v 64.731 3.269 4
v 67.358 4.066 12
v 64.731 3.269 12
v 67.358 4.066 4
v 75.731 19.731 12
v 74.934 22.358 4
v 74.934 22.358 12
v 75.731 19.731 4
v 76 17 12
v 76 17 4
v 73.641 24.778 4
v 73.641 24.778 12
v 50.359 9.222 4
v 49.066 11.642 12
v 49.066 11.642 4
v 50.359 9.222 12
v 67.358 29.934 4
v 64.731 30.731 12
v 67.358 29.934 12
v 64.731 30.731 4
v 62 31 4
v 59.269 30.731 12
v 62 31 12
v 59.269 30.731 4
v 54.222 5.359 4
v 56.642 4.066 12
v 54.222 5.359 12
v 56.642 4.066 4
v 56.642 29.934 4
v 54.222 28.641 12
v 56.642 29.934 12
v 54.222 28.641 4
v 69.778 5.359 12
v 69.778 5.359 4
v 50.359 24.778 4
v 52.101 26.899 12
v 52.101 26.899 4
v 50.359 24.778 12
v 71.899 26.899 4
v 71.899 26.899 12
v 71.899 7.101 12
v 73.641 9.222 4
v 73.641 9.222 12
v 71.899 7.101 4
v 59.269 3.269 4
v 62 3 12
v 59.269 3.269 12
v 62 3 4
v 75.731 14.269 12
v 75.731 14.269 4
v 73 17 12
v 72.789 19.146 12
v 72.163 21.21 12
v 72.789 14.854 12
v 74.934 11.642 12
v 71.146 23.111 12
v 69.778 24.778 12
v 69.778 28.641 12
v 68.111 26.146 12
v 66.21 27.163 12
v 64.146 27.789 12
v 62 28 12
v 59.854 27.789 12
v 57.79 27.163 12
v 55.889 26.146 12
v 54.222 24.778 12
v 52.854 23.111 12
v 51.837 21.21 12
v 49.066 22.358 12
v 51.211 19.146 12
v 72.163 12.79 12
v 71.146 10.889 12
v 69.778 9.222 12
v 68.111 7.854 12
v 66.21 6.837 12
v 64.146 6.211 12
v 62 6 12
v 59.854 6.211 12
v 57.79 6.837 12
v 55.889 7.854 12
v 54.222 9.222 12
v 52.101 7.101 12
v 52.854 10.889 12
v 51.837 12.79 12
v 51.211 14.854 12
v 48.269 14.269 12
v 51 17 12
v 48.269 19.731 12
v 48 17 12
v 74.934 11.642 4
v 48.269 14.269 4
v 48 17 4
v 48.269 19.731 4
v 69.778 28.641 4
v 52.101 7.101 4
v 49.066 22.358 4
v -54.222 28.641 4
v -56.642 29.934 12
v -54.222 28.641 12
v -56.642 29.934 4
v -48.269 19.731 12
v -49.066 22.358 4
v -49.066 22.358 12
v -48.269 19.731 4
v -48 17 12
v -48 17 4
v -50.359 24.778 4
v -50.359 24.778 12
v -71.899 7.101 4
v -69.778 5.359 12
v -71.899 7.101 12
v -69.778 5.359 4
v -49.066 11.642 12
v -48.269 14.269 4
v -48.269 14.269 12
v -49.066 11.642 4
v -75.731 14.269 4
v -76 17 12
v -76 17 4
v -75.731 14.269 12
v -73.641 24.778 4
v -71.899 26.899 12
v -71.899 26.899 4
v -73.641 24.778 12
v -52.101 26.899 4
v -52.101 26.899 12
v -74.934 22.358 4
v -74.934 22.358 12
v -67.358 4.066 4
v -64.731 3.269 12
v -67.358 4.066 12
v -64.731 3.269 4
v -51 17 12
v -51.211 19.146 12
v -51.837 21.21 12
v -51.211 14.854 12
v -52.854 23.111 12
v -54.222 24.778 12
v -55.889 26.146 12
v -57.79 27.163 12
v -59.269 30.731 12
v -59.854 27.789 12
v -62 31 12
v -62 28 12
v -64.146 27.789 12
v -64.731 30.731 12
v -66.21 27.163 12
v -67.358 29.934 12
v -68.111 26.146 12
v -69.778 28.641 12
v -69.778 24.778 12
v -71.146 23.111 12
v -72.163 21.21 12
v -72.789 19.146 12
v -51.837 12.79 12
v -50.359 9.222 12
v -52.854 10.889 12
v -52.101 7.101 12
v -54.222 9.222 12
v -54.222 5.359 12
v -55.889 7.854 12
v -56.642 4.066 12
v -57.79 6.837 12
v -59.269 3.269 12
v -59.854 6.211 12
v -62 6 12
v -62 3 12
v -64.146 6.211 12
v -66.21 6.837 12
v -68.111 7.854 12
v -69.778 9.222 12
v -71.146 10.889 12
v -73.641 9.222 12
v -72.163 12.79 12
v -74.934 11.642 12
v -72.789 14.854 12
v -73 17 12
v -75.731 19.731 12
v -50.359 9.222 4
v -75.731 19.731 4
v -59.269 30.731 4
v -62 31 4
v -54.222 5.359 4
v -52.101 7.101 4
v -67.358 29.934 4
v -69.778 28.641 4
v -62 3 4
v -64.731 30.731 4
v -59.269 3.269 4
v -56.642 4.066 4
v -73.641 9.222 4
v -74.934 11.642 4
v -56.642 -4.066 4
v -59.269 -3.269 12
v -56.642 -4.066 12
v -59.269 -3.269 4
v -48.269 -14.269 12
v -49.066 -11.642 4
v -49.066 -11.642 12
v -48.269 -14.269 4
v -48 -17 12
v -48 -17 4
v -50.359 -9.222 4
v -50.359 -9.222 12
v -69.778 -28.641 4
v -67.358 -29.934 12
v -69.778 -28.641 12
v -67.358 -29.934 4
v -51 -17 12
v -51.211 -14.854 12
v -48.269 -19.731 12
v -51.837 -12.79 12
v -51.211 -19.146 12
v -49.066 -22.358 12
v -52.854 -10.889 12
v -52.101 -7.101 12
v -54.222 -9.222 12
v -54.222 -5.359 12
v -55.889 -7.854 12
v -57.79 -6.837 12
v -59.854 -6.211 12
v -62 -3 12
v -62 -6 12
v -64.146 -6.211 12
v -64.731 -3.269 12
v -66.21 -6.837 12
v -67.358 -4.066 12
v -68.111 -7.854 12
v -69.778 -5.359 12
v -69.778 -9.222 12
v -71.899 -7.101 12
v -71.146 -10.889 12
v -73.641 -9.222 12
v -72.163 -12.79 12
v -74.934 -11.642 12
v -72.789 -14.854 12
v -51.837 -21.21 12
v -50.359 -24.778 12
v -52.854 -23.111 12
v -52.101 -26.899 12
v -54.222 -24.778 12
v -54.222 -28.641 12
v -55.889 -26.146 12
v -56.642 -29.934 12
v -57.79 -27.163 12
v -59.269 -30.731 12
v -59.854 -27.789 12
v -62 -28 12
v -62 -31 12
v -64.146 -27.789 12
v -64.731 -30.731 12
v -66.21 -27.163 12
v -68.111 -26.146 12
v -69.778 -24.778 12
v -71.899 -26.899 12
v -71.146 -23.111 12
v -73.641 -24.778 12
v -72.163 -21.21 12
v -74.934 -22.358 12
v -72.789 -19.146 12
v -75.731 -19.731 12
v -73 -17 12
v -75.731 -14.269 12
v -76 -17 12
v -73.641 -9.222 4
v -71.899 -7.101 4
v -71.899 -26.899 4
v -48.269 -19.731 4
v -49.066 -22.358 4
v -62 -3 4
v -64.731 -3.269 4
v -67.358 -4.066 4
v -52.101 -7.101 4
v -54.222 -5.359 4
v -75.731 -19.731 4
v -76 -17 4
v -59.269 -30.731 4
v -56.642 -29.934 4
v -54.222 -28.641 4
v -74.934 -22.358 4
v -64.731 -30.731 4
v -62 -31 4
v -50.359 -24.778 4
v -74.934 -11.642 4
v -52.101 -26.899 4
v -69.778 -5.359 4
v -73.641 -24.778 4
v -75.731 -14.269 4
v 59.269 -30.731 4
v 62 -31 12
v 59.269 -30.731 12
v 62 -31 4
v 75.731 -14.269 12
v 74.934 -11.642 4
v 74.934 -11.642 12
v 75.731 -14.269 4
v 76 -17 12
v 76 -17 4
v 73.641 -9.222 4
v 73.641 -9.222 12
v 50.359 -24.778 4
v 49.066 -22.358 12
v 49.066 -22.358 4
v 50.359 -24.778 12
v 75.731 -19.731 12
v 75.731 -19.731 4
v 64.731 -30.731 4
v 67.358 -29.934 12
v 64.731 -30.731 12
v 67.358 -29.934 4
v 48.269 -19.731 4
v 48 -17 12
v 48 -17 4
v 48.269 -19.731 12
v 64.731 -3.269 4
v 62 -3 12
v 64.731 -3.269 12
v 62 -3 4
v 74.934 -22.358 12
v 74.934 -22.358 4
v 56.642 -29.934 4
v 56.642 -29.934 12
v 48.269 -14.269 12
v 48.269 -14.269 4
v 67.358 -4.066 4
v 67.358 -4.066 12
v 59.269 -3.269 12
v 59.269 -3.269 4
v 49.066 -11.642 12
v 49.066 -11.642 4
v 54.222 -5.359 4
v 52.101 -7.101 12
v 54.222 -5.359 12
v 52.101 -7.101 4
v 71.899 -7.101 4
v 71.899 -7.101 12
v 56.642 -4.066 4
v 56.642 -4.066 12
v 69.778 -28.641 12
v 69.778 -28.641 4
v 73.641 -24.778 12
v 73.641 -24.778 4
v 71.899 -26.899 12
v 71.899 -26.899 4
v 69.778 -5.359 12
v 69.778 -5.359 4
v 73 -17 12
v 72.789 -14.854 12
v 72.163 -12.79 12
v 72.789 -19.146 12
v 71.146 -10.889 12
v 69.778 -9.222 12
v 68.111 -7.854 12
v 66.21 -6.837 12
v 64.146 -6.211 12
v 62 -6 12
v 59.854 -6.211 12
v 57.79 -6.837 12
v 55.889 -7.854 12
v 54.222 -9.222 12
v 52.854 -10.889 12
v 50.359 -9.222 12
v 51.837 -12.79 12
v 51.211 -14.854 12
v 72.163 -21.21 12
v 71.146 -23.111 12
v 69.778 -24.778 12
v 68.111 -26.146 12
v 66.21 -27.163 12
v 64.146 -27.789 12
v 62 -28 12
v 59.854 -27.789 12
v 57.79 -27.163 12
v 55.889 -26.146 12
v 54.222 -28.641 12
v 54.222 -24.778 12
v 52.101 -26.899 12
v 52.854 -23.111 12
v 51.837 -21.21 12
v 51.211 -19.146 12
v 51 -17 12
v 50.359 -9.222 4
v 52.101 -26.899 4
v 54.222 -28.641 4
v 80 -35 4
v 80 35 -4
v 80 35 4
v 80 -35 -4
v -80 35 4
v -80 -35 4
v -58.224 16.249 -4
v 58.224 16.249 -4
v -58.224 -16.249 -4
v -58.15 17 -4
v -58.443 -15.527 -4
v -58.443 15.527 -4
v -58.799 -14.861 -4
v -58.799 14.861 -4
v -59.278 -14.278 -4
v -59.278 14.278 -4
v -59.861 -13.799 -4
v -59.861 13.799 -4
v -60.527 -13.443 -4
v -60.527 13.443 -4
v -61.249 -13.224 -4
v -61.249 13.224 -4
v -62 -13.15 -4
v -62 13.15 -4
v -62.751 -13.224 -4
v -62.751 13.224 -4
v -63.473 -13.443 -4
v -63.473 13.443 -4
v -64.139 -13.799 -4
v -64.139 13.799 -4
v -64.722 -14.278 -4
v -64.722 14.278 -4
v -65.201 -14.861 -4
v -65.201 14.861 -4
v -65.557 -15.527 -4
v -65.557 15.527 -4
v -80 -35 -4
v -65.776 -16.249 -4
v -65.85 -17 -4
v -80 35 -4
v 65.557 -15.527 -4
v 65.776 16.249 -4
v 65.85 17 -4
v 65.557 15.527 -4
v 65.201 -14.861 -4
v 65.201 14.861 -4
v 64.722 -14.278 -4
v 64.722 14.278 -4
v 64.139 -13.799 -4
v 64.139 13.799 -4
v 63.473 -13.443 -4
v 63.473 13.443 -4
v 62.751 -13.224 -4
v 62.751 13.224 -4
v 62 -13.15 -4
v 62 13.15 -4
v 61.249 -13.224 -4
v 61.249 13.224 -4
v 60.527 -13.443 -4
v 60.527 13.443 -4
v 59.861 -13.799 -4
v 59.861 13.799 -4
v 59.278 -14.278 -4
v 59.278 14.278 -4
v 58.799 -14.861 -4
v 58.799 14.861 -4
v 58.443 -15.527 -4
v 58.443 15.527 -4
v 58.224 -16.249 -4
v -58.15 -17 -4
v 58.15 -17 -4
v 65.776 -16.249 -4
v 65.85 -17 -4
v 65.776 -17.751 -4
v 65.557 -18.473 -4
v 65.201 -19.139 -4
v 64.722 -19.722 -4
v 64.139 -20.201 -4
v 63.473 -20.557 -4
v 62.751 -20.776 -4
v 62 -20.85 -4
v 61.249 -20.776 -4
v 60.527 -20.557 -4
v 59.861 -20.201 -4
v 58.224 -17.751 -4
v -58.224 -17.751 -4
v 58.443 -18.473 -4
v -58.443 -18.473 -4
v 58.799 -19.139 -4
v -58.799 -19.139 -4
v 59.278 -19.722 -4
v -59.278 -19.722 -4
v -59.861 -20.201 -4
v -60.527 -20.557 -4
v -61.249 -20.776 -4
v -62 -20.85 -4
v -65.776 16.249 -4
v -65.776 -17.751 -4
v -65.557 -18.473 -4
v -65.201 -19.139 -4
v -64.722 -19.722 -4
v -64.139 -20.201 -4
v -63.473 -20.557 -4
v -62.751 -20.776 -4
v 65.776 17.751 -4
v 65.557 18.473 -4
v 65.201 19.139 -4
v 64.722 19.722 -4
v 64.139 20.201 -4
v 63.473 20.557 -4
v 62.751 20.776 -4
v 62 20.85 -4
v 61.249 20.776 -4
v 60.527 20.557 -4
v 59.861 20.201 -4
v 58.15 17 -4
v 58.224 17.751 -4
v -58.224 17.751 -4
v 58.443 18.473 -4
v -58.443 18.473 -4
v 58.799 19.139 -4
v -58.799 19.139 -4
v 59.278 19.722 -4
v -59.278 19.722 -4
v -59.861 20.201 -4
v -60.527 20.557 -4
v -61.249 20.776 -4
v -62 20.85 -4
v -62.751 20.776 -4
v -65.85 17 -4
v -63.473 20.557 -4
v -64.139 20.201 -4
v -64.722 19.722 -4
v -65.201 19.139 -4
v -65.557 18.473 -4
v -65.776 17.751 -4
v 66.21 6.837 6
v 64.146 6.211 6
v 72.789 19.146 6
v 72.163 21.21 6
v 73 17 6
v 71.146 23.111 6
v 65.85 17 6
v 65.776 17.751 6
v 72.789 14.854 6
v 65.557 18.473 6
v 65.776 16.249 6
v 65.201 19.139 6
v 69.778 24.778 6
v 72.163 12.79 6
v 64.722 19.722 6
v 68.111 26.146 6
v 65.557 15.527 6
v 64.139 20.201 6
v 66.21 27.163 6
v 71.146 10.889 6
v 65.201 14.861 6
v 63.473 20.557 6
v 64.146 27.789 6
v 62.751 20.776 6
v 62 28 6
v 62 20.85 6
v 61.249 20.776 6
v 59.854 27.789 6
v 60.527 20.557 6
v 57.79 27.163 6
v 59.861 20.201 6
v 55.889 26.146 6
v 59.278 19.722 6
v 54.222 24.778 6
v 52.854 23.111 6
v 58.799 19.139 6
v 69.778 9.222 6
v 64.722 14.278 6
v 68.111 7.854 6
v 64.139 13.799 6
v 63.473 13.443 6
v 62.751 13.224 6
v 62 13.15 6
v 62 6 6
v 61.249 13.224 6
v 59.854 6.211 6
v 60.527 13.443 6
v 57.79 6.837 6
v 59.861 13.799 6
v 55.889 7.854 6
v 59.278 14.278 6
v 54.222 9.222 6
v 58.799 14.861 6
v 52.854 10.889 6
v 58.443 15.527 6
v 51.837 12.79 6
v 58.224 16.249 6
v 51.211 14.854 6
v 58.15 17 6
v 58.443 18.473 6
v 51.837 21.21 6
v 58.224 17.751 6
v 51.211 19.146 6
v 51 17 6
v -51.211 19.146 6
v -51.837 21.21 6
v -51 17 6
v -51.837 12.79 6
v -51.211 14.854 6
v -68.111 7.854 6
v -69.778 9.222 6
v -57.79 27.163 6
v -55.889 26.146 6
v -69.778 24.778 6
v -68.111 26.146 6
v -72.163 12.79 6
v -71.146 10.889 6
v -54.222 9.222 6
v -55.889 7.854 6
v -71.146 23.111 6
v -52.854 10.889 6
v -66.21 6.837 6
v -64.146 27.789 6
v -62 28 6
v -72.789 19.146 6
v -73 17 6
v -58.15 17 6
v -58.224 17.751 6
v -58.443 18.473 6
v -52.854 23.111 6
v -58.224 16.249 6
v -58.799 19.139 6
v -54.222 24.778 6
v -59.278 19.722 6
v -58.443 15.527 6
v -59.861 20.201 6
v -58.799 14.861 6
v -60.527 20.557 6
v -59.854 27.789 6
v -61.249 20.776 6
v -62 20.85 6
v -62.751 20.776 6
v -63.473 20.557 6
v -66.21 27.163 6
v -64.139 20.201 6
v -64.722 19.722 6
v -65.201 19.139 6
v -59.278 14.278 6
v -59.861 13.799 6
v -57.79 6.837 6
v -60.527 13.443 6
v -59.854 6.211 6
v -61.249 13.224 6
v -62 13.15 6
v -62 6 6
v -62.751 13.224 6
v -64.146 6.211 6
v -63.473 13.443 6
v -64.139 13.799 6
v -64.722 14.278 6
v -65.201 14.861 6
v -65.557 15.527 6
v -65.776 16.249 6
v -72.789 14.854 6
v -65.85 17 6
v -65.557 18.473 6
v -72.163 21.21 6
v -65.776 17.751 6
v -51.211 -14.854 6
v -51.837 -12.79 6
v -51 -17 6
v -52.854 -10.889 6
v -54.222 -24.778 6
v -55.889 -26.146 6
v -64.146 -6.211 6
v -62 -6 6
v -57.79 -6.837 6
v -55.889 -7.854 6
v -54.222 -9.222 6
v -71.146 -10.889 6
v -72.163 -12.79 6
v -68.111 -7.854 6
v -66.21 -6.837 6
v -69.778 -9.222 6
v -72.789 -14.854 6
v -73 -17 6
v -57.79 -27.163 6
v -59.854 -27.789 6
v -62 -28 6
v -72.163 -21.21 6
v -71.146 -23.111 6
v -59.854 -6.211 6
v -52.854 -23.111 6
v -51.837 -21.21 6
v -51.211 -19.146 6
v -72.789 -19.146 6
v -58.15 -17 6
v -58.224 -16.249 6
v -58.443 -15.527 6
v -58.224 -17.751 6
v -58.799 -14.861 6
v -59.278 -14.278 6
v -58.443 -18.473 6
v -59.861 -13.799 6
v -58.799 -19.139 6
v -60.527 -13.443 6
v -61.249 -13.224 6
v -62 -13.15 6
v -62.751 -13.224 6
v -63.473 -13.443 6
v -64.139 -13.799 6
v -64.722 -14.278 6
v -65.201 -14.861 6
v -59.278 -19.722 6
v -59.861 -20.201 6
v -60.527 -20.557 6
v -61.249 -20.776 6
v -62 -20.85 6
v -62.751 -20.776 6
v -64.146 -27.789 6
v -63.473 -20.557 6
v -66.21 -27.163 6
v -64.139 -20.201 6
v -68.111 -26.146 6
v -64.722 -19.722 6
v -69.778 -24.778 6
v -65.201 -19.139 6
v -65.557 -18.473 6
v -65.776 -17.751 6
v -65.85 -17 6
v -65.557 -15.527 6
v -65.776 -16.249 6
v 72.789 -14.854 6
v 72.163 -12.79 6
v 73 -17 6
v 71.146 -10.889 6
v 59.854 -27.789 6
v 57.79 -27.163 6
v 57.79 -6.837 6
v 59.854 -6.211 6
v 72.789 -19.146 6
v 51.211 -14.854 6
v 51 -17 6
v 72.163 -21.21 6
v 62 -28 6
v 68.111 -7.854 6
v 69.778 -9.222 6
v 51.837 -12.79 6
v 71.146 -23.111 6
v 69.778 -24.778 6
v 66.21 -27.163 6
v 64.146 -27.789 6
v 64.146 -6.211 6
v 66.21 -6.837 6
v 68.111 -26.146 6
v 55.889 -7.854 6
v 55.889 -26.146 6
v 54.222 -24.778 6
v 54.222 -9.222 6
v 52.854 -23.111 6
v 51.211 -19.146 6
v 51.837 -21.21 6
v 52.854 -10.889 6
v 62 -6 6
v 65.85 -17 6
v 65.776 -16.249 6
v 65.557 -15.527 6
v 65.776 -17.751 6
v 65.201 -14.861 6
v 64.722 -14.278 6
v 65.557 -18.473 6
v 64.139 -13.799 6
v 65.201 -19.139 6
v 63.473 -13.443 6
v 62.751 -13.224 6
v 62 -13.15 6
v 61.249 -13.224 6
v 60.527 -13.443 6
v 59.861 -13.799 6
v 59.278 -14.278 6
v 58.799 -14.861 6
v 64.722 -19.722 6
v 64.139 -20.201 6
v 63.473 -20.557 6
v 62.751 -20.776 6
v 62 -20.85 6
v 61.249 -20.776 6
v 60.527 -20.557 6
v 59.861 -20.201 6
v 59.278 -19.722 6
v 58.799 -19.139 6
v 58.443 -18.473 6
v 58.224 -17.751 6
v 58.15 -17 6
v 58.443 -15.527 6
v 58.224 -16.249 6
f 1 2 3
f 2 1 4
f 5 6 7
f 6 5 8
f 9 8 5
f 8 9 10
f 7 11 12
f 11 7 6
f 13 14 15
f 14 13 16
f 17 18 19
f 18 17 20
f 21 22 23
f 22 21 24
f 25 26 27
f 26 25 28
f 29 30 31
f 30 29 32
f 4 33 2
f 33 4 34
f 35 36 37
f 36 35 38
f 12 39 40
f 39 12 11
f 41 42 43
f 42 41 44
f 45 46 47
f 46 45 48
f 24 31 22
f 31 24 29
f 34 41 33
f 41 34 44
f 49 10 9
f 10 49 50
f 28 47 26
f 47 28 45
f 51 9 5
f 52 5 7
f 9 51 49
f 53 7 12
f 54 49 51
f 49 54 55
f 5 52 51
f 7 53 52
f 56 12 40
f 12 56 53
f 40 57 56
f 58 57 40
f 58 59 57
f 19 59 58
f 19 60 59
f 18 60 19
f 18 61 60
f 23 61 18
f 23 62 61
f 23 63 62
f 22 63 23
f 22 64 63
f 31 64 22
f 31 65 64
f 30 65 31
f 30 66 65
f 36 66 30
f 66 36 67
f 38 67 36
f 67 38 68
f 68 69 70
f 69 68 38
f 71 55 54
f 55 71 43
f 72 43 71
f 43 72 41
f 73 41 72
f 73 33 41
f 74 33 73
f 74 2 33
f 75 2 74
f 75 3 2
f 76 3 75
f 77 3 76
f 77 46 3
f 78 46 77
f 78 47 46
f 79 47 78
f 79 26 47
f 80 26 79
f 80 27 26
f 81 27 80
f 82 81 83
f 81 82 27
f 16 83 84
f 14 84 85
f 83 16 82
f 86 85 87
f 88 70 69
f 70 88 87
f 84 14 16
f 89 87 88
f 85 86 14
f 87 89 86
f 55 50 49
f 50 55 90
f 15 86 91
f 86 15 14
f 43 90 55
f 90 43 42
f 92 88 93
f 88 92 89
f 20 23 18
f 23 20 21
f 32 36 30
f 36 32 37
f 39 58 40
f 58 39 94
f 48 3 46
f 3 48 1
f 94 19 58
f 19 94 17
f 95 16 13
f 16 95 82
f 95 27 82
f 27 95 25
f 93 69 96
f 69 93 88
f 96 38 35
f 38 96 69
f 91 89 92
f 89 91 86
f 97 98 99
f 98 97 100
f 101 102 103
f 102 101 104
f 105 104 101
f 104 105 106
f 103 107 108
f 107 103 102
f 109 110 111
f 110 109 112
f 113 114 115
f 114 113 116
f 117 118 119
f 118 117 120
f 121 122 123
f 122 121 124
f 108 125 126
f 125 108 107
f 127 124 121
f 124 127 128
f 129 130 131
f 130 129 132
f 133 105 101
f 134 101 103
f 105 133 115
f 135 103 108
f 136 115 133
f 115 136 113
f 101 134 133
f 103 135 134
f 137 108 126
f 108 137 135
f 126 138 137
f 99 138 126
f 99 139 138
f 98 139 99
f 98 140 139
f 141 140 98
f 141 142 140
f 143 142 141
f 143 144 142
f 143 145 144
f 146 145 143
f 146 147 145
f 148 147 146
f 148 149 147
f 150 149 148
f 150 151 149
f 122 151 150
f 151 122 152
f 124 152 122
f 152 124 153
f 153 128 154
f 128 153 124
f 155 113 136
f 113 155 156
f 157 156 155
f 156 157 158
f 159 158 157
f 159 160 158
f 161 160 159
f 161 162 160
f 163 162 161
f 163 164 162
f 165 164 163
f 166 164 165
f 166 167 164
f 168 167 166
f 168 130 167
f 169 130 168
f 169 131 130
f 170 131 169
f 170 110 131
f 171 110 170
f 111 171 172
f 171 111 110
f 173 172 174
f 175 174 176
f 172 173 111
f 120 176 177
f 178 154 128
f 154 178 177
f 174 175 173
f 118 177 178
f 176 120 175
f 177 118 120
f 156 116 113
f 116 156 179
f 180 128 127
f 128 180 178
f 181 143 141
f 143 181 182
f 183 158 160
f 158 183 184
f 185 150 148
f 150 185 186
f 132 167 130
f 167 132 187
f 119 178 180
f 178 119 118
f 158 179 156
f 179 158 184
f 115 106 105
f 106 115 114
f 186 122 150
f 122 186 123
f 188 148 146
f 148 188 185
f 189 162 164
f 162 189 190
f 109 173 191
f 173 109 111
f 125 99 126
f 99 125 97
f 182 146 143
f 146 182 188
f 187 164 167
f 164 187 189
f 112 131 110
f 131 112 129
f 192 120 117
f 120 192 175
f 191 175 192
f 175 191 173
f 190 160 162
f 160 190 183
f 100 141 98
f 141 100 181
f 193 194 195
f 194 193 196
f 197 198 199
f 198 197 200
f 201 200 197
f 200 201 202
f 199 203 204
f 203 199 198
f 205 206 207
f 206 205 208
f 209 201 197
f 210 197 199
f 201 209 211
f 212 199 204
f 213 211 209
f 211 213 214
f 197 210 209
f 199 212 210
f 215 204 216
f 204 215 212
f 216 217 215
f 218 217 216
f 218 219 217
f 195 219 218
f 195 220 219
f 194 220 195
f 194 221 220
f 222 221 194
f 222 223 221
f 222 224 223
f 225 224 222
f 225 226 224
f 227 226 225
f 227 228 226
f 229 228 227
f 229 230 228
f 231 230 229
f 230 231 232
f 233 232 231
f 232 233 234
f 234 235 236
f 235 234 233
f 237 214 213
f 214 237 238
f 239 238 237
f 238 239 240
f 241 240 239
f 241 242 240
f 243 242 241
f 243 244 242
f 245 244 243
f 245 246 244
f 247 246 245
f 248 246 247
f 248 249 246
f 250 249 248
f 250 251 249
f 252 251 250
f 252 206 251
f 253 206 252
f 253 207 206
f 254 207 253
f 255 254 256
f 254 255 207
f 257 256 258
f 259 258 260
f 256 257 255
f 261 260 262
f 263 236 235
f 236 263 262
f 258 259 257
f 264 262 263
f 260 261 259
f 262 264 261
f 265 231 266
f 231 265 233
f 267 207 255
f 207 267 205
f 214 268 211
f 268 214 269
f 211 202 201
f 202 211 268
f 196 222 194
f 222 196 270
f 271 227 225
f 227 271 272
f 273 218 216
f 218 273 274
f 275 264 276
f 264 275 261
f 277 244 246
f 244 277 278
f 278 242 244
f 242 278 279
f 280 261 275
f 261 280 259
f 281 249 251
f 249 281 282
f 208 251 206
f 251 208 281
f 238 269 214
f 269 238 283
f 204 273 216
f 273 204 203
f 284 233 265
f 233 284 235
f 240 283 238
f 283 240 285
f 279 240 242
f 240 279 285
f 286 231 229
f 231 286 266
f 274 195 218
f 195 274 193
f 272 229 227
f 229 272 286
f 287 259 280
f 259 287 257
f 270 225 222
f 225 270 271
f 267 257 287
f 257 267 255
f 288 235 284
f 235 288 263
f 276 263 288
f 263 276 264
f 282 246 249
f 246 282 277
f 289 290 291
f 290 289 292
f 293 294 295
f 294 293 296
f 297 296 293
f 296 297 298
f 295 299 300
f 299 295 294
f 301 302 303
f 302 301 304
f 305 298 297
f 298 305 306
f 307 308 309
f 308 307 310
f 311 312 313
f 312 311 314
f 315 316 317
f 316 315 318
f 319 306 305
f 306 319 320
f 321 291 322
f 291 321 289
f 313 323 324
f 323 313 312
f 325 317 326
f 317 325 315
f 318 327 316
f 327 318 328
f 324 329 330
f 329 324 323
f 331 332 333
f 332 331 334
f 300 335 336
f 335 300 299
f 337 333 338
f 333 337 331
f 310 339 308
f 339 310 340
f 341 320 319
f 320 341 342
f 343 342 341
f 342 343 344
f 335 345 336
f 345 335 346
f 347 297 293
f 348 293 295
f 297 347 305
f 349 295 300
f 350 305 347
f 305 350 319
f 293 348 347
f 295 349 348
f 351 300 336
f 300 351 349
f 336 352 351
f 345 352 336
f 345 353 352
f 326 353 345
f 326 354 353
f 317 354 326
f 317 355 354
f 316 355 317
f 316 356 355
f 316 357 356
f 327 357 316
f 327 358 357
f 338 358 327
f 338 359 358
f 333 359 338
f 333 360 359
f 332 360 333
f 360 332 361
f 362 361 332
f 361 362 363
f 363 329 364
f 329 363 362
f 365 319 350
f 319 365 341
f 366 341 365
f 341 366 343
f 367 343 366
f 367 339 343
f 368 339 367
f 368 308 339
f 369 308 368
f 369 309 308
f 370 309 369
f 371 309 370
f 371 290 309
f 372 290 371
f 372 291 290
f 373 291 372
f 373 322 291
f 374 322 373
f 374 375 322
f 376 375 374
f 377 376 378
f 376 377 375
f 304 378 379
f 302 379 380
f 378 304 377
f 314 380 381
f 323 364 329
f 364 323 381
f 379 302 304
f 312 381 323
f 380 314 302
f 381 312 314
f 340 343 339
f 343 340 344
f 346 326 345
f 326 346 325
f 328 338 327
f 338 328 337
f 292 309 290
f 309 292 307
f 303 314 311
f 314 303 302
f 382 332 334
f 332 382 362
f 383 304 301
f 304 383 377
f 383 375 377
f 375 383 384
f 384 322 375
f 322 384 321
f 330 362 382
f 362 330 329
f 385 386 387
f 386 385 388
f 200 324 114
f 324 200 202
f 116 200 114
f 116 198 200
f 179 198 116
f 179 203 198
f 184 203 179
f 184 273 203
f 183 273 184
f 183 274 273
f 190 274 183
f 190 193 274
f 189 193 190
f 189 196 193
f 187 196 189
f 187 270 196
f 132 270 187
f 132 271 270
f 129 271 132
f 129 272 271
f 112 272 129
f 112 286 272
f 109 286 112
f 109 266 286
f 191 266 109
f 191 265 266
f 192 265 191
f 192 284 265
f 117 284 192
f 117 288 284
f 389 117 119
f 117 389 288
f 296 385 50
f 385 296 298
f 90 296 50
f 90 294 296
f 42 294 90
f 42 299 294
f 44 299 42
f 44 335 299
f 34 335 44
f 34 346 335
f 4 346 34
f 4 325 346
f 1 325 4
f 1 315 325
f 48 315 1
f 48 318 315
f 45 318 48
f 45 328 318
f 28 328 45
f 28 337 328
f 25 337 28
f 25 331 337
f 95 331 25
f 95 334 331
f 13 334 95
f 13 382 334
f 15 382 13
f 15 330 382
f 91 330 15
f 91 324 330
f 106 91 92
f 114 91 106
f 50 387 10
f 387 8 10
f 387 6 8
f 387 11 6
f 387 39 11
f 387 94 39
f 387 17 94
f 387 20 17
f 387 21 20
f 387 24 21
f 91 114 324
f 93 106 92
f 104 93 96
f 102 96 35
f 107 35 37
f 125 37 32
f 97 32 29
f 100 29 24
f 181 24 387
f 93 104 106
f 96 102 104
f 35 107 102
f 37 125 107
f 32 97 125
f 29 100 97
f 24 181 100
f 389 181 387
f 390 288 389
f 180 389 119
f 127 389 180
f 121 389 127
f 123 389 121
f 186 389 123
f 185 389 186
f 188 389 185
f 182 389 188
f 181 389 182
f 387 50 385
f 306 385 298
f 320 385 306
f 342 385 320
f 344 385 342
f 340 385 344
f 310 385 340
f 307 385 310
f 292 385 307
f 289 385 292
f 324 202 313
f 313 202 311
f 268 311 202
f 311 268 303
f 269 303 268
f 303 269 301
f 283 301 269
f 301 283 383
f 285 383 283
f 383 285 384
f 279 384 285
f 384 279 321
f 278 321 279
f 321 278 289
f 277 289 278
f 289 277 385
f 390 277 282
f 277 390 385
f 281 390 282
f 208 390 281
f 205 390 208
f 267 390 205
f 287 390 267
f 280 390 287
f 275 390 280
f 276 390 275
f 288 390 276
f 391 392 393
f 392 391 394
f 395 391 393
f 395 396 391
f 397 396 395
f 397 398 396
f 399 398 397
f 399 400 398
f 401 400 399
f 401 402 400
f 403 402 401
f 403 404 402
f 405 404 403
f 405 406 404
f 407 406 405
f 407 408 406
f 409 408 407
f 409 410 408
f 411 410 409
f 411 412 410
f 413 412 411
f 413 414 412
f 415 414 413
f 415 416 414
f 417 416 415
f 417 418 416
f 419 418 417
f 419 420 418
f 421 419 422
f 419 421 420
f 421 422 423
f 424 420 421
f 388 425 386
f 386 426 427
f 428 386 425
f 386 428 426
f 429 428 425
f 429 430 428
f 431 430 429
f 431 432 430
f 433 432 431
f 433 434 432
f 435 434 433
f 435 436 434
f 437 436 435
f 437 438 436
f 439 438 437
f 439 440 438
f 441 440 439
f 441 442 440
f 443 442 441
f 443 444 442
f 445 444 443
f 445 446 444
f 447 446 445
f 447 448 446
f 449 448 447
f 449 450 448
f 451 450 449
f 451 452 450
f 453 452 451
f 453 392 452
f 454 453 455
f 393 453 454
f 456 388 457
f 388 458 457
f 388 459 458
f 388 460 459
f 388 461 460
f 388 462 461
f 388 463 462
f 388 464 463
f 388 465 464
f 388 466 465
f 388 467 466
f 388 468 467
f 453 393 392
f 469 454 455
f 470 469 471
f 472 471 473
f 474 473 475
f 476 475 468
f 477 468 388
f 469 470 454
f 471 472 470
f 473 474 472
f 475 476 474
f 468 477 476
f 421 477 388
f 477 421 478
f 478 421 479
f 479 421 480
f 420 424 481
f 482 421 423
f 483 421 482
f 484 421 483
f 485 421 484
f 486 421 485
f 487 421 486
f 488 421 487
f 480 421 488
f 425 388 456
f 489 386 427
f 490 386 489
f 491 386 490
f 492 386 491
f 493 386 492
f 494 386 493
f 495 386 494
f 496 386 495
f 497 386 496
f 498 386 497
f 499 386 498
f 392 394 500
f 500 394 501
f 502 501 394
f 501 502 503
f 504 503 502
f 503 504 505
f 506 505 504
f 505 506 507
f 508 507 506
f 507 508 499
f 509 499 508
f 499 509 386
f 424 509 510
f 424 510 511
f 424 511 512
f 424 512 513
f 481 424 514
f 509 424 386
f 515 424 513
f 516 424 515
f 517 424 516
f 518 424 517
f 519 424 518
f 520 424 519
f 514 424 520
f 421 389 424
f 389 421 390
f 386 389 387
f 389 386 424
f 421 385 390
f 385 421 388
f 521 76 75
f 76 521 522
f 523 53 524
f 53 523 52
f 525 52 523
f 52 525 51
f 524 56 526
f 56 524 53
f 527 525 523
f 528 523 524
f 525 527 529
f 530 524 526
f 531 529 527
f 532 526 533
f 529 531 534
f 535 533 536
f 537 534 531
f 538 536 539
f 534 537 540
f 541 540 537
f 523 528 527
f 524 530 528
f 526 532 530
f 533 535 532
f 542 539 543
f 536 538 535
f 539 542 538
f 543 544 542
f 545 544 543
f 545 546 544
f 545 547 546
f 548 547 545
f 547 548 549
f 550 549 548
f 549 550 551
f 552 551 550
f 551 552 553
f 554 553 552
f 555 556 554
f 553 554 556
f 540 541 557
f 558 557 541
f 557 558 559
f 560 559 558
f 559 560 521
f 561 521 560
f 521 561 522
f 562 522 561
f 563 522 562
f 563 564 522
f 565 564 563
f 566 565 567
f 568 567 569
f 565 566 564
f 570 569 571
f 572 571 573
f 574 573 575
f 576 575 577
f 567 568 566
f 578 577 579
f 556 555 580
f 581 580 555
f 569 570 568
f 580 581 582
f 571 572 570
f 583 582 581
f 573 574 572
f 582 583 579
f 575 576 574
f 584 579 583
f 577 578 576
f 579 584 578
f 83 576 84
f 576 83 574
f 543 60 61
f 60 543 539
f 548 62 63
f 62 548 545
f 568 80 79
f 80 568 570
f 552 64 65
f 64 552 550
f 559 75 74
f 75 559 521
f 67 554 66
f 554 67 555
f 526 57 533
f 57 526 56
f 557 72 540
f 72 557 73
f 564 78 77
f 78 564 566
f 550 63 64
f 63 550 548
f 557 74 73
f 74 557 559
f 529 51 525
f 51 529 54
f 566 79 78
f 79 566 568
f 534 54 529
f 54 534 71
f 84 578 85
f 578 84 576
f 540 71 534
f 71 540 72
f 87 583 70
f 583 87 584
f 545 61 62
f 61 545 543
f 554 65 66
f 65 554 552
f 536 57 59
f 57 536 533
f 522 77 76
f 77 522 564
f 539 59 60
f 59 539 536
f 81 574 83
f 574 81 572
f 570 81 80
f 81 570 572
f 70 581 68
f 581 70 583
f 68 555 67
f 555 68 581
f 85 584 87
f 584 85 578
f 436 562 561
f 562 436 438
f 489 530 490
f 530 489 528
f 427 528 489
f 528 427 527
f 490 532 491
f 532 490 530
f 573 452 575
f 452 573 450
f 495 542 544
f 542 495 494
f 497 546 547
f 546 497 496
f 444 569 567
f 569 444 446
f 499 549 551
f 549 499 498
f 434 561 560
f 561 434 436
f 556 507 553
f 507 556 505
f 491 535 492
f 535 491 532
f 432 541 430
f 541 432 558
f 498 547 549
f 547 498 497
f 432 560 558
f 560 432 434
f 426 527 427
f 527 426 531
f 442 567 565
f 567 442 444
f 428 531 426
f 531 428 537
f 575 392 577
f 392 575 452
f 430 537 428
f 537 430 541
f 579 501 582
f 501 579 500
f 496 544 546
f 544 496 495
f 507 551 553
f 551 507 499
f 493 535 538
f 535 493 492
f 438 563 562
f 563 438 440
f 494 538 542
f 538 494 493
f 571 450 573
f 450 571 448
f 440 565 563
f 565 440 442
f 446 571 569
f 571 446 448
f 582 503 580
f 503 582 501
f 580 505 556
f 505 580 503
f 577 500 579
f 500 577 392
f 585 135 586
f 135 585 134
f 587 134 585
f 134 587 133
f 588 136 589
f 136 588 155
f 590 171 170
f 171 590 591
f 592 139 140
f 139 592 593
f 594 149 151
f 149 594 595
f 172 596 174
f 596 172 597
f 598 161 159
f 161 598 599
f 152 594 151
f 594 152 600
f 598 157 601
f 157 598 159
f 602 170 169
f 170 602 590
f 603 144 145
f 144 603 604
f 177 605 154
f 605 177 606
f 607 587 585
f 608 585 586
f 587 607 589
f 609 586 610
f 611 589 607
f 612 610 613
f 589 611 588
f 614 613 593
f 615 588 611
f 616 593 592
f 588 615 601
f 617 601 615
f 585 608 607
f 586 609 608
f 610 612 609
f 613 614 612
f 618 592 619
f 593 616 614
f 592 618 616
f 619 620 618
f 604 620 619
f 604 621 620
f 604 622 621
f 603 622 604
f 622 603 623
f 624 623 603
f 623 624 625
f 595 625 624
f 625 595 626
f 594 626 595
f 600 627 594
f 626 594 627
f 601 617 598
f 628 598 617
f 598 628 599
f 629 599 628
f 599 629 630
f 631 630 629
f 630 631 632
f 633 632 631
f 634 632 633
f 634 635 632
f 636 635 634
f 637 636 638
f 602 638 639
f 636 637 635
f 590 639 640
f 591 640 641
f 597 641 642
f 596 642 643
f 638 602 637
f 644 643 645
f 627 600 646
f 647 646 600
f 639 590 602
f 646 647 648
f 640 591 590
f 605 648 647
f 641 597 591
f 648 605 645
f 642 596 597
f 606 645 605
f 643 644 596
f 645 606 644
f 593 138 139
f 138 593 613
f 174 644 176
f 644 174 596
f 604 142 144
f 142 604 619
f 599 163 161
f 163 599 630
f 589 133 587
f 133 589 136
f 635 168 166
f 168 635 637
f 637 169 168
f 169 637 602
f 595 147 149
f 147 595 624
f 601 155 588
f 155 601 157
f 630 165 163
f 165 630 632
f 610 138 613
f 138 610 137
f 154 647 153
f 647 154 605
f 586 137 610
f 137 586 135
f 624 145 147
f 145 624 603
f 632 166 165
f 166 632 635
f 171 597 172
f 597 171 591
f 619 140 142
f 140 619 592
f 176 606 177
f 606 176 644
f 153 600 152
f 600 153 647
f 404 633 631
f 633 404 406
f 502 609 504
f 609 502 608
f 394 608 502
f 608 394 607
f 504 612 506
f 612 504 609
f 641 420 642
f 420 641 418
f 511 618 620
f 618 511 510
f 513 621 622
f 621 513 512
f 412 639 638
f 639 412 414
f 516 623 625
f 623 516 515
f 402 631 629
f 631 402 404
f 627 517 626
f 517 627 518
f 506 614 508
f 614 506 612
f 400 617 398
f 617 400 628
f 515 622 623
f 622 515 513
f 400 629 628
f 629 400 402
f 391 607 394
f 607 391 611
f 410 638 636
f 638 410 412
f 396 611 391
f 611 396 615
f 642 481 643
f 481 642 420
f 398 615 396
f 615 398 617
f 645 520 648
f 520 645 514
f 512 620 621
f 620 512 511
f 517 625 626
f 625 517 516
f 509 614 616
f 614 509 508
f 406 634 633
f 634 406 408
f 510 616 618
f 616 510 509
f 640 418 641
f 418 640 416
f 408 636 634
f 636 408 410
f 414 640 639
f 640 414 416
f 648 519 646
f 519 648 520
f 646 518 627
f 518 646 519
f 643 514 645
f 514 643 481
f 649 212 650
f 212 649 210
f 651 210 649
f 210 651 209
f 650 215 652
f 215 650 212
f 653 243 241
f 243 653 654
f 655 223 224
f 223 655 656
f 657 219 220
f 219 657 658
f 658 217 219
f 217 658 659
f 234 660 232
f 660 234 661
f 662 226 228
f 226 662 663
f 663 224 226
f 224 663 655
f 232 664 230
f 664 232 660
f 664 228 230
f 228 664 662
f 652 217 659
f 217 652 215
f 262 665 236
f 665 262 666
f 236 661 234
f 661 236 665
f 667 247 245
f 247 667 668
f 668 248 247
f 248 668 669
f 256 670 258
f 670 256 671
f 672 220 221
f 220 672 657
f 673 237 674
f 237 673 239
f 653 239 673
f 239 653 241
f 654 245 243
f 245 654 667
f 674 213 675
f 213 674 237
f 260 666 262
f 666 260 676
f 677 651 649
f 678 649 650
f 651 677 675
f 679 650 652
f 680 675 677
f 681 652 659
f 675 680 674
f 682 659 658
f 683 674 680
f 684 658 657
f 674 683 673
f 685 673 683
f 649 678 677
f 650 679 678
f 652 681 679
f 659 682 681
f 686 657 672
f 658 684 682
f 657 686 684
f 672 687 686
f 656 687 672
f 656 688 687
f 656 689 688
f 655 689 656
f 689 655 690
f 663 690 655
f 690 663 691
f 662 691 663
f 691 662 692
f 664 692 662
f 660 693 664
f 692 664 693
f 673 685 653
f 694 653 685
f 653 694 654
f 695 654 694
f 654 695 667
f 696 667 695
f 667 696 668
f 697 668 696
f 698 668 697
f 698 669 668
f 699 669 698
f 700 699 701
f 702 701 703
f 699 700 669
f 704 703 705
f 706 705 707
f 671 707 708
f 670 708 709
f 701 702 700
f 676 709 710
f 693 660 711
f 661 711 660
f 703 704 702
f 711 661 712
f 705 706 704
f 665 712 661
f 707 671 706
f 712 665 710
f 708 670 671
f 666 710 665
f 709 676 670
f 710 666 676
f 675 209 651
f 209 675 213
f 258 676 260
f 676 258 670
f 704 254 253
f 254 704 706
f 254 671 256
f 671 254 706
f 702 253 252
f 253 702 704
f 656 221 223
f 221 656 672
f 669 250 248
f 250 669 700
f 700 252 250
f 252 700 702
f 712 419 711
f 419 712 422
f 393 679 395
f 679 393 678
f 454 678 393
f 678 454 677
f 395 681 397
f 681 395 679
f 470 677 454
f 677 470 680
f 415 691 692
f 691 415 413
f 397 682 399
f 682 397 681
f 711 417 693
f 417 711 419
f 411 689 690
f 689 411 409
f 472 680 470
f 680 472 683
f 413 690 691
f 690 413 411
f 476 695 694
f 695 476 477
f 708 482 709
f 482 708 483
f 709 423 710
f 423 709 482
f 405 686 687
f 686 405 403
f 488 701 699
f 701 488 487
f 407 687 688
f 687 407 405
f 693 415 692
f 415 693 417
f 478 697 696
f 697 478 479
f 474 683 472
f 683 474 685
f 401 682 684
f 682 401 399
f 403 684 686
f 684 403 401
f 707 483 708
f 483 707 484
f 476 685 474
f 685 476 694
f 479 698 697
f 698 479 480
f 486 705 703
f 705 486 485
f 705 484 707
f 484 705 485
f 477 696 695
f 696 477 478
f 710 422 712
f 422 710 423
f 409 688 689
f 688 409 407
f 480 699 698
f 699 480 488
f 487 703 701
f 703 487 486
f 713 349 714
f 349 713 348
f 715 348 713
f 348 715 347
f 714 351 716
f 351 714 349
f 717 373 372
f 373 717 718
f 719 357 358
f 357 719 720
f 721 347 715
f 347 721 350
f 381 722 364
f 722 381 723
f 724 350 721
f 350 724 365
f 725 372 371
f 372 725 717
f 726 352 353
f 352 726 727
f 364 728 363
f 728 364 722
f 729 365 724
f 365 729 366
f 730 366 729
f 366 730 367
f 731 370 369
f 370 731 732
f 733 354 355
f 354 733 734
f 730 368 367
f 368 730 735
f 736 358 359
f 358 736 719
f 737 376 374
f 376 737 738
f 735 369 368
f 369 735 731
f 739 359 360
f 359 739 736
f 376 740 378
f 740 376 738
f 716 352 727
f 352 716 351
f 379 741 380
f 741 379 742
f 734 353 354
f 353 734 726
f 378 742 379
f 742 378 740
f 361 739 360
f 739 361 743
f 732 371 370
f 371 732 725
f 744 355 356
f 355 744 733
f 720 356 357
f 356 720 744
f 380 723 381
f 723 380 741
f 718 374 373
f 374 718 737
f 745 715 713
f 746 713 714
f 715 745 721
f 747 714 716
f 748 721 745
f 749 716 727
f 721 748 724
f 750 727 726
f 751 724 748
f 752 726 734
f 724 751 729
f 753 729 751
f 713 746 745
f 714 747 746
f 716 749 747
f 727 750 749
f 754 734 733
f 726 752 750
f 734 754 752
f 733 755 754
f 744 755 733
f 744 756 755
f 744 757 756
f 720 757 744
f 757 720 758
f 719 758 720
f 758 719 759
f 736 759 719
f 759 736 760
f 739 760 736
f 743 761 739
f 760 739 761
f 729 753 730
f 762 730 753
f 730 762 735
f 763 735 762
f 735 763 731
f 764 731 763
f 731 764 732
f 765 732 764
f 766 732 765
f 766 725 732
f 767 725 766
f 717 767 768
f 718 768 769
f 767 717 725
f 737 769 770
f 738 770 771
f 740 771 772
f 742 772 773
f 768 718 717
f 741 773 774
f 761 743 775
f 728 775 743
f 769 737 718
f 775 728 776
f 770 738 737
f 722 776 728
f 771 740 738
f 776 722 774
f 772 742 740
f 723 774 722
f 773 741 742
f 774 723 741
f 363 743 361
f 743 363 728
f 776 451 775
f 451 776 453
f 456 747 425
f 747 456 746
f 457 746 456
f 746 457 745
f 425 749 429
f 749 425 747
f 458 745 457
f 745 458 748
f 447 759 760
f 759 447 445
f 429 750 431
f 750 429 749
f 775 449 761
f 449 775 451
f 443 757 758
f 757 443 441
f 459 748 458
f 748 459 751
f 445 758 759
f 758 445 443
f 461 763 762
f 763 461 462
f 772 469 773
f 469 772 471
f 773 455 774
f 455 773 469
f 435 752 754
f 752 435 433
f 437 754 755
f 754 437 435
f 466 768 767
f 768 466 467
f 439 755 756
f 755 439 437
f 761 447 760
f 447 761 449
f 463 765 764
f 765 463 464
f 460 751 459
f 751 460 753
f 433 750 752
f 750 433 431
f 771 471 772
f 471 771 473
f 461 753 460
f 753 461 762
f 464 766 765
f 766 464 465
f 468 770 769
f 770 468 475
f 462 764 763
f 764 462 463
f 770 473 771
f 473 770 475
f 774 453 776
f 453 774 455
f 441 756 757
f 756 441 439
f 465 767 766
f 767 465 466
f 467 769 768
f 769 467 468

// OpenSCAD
$fn = 32;

// ----------------------------------------------------------------------
// Socket pad plate
// bosses with counterbored sockets for the screws
// ----------------------------------------------------------------------

// --- parameters (mm) ---
base_t = 8;            // base plate thickness
boss_h = 8;            // boss height above the base plate
boss_d = 28;           // boss diameter
socket_d = 22;         // socket diameter
socket_depth = 6;      // socket depth from the boss face
bolt_d = 7.7;          // screw clearance hole through the socket floor
plate = [160, 70, 8];  // overall size (x, y, z)
edge = 18;             // boss centre offset from the plate edge
pads = 4;              // boss count, one per corner

// --- derived feature positions (mm) ---
height = base_t + boss_h;        // = 16   overall height of the part
corner_x = plate[0] / 2 - edge;  // = 62   boss centre X
corner_y = plate[1] / 2 - edge;  // = 17   boss centre Y
feature_centers = [
  [corner_x, corner_y],
  [-corner_x, corner_y],
  [-corner_x, -corner_y],
  [corner_x, -corner_y]
];   // boss centres: sockets, holes and the pads themselves are placed from here

// base plate, bosses on feature_centers, socket + through hole in each
difference() {
  union() {
    cube(plate, center = true);
    for (centre = feature_centers)
      translate([centre[0], centre[1], plate[2] / 2 - 1])
        cylinder(d = boss_d, h = boss_h + 1);
  }
  for (centre = feature_centers) {
    translate([centre[0], centre[1], plate[2] / 2 + boss_h - socket_depth])
      cylinder(d = socket_d, h = socket_depth + 1);
    translate([centre[0], centre[1], -height])
      cylinder(d = bolt_d, h = 2 * height + 2);  // through the socket floor
  }
}
